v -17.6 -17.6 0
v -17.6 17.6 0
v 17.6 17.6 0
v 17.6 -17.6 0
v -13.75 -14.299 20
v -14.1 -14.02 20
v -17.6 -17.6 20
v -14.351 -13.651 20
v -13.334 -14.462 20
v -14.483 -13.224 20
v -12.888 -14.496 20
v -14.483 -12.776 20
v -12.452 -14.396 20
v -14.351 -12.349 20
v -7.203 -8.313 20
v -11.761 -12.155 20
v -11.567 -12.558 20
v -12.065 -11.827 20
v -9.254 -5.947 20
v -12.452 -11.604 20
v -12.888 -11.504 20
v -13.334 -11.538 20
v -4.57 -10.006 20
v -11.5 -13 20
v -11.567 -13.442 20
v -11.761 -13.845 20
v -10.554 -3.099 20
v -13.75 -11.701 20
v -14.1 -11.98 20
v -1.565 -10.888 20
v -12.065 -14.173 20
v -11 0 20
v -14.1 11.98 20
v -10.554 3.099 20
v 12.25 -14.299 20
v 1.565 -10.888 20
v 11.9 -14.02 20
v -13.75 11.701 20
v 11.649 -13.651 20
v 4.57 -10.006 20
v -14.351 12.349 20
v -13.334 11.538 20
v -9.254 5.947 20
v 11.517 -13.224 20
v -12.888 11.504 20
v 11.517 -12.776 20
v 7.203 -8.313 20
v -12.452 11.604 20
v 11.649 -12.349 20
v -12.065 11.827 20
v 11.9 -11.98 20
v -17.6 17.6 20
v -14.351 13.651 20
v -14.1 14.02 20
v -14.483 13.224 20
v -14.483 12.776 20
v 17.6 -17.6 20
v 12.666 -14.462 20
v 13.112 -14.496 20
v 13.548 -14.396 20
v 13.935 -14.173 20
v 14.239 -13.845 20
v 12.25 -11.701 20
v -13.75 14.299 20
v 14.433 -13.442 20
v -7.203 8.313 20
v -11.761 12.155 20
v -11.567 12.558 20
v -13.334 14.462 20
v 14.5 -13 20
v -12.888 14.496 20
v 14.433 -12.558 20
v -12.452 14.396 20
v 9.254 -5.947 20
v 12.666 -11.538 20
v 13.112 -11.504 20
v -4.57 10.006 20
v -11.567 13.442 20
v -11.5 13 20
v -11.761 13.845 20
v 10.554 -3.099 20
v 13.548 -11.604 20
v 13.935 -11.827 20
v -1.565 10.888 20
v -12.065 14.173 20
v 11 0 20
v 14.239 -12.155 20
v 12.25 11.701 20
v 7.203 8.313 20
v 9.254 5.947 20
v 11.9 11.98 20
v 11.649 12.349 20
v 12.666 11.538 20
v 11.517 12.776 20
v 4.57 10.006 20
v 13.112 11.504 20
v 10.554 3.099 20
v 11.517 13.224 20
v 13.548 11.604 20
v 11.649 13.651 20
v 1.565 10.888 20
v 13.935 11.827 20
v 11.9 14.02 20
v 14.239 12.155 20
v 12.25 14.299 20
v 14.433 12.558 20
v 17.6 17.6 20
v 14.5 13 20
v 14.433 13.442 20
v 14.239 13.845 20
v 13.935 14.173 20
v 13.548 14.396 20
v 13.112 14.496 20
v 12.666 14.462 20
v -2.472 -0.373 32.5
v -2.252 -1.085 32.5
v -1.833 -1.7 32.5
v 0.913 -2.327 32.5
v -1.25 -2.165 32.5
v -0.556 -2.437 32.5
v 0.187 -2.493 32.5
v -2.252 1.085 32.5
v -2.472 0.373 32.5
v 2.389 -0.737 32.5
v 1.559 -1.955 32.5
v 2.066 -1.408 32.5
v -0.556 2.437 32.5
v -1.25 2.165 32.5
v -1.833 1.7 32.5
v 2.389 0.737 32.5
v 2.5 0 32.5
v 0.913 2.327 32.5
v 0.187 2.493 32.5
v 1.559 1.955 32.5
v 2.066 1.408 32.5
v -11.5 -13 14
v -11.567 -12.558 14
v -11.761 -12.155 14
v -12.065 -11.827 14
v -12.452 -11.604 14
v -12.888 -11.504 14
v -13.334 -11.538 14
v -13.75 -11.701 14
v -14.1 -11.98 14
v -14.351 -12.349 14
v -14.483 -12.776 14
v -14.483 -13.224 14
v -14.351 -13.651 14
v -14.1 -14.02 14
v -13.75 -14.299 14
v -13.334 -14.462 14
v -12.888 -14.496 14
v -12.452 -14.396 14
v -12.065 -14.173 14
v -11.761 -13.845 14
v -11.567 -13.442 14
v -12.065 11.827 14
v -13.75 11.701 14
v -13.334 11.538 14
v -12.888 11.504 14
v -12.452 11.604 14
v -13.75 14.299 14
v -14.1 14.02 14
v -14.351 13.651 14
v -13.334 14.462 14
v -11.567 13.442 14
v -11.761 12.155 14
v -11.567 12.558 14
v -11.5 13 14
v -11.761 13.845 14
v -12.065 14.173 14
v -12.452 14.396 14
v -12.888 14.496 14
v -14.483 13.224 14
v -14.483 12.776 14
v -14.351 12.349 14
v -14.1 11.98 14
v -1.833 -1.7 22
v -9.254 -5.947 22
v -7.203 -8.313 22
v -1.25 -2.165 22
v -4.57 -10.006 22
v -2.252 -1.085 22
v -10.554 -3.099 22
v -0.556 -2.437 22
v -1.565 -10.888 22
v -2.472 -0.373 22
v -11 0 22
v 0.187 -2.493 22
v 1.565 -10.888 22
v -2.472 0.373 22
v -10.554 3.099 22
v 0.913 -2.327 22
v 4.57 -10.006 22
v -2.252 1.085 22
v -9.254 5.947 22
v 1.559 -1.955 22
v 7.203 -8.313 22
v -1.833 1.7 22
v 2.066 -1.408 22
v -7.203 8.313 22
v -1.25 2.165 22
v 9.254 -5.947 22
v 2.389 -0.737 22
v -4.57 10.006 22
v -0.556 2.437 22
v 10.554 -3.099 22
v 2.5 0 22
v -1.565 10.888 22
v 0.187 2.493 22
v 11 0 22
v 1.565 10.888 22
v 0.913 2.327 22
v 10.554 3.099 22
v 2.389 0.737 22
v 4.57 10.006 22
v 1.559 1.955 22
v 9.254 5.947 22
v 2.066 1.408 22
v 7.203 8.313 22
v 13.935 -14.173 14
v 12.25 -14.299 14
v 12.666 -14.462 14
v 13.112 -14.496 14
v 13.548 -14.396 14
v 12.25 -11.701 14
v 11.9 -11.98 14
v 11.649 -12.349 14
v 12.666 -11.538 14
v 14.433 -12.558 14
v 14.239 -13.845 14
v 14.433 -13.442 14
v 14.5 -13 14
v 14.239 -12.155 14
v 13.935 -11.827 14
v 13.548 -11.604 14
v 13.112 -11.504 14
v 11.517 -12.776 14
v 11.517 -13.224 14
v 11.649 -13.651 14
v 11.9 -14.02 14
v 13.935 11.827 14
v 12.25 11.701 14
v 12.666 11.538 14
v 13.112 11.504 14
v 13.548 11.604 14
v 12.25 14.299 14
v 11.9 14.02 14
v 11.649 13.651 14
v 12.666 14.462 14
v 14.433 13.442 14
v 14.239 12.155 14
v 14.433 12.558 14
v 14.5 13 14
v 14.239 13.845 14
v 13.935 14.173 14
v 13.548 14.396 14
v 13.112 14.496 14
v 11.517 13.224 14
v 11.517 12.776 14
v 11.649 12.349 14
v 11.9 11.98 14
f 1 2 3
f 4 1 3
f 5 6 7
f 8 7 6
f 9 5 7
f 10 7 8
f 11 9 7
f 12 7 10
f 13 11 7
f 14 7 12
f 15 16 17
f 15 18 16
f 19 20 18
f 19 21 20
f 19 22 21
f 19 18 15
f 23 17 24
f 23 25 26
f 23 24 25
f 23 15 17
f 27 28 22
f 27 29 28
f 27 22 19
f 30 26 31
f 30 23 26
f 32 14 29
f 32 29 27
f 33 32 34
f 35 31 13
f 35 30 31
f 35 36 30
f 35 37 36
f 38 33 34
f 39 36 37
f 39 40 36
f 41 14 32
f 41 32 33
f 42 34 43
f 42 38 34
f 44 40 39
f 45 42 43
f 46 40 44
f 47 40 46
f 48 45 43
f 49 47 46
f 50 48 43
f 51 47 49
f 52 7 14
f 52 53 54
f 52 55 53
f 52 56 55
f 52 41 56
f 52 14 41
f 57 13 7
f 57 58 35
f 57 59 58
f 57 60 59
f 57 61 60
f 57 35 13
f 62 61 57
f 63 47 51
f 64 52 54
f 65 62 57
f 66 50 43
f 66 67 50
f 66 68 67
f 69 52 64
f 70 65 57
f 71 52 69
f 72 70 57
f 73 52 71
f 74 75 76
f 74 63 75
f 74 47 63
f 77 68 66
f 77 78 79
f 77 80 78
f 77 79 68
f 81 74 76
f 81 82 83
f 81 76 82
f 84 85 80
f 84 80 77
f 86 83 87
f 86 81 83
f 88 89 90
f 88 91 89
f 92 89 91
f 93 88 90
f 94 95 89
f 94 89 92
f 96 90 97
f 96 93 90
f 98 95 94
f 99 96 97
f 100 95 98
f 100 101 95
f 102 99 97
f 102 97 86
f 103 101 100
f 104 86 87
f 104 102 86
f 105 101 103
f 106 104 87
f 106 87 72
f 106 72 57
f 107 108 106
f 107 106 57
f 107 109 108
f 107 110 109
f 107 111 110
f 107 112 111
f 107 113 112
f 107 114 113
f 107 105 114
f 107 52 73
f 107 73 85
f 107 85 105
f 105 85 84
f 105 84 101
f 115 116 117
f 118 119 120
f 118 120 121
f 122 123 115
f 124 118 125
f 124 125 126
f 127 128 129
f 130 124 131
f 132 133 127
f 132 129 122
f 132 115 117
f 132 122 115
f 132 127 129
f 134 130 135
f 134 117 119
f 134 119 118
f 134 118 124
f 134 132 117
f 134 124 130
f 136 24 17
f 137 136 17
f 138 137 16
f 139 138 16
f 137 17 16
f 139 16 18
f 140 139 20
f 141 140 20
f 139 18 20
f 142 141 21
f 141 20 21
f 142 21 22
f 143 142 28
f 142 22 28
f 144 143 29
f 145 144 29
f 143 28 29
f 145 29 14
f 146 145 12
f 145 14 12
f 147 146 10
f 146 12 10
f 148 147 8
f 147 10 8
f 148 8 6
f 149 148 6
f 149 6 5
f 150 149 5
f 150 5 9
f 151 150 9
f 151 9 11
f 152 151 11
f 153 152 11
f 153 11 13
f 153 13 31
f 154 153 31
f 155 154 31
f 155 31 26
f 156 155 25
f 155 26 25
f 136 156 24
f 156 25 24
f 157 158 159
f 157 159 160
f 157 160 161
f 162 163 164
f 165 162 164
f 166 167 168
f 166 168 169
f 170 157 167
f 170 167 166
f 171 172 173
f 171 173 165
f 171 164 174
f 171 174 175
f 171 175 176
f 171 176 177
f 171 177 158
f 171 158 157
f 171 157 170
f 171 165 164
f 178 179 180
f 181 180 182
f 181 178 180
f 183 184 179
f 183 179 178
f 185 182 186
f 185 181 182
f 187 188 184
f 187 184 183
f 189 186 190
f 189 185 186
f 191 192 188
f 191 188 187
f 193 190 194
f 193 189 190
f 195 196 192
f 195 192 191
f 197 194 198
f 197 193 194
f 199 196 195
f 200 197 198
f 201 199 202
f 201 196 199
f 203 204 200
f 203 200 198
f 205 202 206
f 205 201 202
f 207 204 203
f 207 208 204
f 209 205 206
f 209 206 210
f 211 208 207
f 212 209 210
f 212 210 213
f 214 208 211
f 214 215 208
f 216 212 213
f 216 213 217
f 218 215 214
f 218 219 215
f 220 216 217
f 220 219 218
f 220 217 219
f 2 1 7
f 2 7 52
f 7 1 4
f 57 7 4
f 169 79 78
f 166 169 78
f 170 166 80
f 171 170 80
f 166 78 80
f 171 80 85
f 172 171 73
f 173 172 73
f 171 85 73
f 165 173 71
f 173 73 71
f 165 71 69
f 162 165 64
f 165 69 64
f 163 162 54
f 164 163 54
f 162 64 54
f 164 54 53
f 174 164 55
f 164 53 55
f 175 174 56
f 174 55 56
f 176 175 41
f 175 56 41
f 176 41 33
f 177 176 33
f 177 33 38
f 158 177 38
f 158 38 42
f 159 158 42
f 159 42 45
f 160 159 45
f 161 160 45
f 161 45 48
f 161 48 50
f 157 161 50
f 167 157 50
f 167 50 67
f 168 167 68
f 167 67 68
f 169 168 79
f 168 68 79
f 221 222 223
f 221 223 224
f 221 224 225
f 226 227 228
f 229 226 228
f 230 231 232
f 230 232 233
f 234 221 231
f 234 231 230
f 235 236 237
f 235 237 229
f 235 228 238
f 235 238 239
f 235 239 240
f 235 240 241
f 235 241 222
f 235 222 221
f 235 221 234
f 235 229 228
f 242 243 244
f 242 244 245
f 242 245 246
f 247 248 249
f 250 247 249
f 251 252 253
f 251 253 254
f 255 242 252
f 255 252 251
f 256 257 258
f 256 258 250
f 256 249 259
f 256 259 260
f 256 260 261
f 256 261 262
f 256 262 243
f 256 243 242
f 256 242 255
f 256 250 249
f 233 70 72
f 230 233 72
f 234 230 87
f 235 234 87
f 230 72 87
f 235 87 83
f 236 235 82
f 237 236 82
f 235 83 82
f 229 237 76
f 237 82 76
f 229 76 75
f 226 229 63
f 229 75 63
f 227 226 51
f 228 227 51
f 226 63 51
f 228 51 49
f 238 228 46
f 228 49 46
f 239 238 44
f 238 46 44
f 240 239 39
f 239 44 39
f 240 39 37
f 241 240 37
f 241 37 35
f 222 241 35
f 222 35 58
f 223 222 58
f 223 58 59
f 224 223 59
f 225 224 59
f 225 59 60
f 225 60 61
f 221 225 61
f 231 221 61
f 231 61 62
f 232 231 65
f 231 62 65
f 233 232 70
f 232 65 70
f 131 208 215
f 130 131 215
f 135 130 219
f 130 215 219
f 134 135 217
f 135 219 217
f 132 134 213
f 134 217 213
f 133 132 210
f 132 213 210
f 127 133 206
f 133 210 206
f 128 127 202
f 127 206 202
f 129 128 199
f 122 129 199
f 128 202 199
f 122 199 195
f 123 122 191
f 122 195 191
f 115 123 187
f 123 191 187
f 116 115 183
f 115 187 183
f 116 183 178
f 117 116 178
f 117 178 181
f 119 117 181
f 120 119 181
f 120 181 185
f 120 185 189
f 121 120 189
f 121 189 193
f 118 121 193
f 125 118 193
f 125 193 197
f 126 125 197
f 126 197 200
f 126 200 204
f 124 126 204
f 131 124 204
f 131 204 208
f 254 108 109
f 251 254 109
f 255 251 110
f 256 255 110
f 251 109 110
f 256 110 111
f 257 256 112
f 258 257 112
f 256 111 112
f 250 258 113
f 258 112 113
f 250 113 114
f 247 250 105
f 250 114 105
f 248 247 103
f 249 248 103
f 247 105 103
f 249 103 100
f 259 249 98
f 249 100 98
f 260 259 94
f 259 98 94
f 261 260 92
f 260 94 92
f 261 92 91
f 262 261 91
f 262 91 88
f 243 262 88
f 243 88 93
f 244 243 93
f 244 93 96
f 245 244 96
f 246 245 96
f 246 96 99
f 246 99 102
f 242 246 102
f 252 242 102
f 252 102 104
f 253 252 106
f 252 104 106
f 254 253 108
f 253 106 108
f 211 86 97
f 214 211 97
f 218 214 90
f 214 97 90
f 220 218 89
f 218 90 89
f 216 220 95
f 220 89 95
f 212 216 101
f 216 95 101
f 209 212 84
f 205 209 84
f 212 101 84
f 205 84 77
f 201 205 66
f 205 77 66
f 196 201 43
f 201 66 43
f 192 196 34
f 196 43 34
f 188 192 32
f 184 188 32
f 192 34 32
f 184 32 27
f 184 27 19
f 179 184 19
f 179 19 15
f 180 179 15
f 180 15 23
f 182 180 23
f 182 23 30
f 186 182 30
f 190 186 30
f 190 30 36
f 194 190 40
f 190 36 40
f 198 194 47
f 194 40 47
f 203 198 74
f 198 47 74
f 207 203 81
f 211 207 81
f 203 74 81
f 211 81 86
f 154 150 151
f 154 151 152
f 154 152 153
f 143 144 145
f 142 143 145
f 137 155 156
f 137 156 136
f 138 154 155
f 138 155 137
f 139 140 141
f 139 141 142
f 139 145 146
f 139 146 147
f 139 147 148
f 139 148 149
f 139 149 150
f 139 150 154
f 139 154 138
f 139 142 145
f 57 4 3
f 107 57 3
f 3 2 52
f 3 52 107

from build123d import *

# Parameters (mm, degrees)
F0_W     = 35.2
F0_H     = 35.2
F1_DEPTH = 20
F2_R     = 11
F3_DEPTH = 2
F4_R     = 2.5
F5_DEPTH = 12.5
F6_R     = 1.5
F7_DEPTH = 6


with BuildPart() as f1:
    # F0 (on Top) → F1 (new body)
    with BuildSketch(Plane.XY):
        Rectangle(F0_W, F0_H)
    extrude(amount=F1_DEPTH)

    # F2 (on face) → F3 (join)
    with BuildSketch(Plane.XY.offset(20)):
        Circle(F2_R)
    extrude(amount=F3_DEPTH)

    # F4 (on face) → F5 (join)
    with BuildSketch(Plane.XY.offset(20)):
        Circle(F4_R)
    extrude(amount=F5_DEPTH)

    # F6 (on face) → F7 (cut)
    with BuildSketch(Plane.XY.offset(20)):
        with Locations((-13, 13)):
            Circle(F6_R)
        with Locations((13, 13)):
            Circle(F6_R)
        with Locations((-13, -13)):
            Circle(F6_R)
        with Locations((13, -13)):
            Circle(F6_R)
    extrude(amount=-F7_DEPTH, mode=Mode.SUBTRACT)


solid = f1.part
